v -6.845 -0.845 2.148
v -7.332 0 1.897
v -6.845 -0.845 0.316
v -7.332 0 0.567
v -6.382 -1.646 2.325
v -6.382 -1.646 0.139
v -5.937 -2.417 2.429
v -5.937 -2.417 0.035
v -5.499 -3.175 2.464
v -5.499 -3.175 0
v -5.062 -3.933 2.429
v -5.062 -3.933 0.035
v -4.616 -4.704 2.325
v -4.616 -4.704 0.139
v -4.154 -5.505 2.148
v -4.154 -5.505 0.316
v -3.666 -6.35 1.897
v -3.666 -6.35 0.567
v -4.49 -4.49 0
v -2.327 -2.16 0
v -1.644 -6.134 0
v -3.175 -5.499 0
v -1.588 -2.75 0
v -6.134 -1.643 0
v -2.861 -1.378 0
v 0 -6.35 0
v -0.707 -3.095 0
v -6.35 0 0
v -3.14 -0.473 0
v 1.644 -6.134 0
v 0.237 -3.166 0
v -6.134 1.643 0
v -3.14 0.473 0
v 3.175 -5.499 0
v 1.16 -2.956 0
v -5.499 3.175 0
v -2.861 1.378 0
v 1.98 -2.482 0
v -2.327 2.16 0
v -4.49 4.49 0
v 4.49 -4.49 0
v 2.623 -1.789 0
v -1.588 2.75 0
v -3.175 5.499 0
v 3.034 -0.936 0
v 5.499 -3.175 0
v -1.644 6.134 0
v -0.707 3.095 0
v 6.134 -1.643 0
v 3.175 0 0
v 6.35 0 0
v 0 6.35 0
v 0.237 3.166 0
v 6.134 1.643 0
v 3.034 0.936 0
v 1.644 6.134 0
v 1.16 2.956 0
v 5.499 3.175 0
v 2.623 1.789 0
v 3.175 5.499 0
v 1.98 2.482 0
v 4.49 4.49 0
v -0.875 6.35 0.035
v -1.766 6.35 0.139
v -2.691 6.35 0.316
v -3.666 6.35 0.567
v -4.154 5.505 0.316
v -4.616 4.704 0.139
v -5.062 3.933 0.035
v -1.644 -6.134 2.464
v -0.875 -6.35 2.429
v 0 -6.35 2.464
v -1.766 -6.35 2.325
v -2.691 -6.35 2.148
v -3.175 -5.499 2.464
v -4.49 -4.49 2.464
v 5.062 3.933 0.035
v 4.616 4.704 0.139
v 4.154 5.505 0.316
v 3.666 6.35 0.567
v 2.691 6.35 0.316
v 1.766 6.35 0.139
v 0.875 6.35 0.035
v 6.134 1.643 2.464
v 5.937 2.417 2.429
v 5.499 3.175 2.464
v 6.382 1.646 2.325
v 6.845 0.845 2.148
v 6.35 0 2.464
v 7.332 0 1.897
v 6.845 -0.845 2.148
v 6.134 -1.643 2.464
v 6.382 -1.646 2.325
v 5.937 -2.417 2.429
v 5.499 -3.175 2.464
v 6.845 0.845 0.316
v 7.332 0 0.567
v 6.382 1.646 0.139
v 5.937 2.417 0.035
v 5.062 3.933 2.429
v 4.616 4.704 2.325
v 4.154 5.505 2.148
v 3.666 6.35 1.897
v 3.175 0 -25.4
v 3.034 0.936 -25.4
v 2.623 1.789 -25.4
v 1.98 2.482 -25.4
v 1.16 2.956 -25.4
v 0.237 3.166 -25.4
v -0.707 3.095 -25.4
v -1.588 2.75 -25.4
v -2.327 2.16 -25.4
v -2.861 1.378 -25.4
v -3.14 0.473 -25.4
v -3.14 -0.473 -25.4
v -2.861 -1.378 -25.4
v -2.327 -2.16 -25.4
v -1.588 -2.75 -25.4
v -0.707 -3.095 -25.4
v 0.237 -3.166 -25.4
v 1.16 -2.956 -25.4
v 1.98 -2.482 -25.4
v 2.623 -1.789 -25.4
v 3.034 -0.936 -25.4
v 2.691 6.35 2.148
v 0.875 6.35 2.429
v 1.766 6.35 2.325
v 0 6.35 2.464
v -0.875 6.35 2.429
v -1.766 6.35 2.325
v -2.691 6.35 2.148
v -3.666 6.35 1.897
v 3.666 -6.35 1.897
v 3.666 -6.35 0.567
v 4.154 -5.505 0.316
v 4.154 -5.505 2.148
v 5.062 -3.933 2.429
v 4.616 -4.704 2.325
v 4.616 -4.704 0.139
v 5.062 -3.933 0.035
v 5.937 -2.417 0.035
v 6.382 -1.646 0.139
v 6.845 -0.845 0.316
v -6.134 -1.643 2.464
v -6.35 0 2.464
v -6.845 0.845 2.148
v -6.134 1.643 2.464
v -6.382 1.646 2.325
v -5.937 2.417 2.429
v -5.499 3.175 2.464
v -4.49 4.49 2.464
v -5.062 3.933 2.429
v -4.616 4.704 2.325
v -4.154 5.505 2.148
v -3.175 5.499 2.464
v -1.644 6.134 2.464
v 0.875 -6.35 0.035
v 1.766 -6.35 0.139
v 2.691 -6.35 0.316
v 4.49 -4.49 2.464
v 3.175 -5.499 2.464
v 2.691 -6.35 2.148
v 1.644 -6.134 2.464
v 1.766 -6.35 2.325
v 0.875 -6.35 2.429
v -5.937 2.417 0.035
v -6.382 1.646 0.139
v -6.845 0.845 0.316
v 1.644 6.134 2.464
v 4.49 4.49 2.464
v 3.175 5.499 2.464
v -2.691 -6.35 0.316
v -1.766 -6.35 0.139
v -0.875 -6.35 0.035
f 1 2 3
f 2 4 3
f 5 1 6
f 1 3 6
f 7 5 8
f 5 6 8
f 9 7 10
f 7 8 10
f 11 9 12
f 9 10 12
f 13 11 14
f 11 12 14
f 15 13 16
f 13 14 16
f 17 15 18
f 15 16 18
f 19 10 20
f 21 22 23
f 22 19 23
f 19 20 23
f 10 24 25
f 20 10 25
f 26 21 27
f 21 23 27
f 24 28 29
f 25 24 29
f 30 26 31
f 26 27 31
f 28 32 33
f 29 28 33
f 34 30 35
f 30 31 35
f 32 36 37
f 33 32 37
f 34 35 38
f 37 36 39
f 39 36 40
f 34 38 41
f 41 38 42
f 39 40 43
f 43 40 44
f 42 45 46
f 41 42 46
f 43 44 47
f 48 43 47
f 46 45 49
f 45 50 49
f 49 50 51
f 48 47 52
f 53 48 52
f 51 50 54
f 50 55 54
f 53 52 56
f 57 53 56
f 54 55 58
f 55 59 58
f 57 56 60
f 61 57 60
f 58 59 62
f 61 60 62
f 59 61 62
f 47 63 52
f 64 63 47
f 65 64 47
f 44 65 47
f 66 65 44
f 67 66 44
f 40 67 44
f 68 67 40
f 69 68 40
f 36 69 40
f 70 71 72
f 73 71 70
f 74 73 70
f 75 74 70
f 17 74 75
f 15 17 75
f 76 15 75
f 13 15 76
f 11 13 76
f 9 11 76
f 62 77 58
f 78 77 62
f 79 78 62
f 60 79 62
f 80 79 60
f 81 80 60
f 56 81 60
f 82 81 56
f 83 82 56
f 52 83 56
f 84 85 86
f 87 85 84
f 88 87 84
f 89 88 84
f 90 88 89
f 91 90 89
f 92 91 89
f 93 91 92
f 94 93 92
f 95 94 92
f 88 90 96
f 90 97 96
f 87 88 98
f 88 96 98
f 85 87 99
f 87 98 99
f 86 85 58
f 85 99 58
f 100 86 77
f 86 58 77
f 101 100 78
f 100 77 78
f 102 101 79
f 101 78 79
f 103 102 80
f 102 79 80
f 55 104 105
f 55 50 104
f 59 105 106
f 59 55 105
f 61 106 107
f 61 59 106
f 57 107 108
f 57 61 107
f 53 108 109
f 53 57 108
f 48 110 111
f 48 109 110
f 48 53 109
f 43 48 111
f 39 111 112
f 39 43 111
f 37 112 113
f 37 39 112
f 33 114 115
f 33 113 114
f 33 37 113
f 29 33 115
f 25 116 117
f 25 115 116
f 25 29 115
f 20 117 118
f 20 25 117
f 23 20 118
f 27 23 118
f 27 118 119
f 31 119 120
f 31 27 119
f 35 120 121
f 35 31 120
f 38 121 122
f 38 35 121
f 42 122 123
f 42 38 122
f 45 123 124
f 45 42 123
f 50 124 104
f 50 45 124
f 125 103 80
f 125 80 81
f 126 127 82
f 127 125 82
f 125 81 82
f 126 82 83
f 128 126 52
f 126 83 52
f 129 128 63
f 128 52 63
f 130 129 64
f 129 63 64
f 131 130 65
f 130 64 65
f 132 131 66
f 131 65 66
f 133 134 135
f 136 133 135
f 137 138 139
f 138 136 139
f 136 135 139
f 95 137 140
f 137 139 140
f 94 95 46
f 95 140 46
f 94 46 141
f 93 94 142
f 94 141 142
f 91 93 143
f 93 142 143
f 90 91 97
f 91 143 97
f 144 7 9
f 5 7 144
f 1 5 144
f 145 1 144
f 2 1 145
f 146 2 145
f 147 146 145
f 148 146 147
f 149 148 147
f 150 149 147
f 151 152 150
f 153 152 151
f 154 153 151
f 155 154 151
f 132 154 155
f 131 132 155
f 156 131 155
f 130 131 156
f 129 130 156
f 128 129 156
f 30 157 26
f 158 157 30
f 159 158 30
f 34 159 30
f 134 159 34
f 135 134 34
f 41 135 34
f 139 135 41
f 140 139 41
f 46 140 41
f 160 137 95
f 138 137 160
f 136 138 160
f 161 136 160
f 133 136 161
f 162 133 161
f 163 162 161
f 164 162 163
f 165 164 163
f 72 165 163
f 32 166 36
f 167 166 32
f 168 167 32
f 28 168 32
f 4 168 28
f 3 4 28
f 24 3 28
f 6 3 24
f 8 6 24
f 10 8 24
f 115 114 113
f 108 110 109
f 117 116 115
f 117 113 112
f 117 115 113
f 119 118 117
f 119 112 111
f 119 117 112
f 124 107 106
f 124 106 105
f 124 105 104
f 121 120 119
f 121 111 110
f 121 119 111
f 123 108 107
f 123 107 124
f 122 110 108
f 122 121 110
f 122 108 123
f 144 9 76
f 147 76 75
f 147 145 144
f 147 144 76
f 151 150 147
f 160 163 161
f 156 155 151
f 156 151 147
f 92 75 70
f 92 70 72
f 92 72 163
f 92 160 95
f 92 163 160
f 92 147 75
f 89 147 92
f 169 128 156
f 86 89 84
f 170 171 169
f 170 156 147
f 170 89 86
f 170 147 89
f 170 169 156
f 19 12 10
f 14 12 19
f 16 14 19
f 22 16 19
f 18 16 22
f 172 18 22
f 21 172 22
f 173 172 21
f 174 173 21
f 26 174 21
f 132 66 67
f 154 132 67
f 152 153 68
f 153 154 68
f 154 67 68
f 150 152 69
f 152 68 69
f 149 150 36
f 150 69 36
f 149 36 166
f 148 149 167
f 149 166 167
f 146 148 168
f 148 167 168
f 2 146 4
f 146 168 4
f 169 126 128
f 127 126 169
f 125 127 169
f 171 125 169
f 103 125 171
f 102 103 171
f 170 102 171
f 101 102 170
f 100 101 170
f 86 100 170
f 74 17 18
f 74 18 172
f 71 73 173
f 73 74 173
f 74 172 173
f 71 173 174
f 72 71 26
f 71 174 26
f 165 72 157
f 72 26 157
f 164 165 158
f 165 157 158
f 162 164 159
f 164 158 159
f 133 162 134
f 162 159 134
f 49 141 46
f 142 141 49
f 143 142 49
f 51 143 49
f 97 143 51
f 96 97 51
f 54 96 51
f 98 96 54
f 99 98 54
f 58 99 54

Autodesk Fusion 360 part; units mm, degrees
sketch "Sketch1" plane through (0, 0, 0) normal (0, 0, 1) x (1, 0, 0)
  line L0 (-3.6662, -6.35) -> (3.6662, -6.35)
  line L1 (3.6662, -6.35) -> (7.3323, 0)
  line L2 (7.3323, 0) -> (3.6662, 6.35)
  line L3 (3.6662, 6.35) -> (-3.6662, 6.35)
  line L4 (-3.6662, 6.35) -> (-7.3323, 0)
  line L5 (-7.3323, 0) -> (-3.6662, -6.35)
  dimension "hexwidth" = 12.7
extrude "Extrude1" add sketch "Sketch1" along normal blind 2.4638
sketch "Sketch2" plane through (0, 0, 0) normal (0, 0, -1) x (1, 0, 0)
  line L0 (-3.6662, 6.35) -> (-7.3323, 0)
  line L1 (-7.3323, 0) -> (-3.6662, -6.35)
  line L2 (-3.6662, -6.35) -> (3.6662, -6.35)
  line L3 (3.6662, -6.35) -> (7.3323, 0)
  line L4 (7.3323, 0) -> (3.6662, 6.35)
  line L5 (3.6662, 6.35) -> (-3.6662, 6.35)
  circle A0 centre (0, 0) radius 3.175
  dimension "diameter" = 6.35
extrude "Extrude2" add sketch "Sketch2" along normal blind 25.4 contours A0
sketch "Sketch3" plane through (0, 0, 2.4638) normal (0, 0, 1) x (-1, 0, 0)
  line L0 (7.3323, 0) -> (3.6662, 6.35) construction
  line L1 (3.6662, 6.35) -> (-3.6662, 6.35) construction
  line L2 (-3.6662, 6.35) -> (-7.3323, 0) construction
  line L3 (-7.3323, 0) -> (-3.6662, -6.35) construction
  line L4 (-3.6662, -6.35) -> (3.6662, -6.35) construction
  line L5 (3.6662, -6.35) -> (7.3323, 0) construction
  circle A0 centre (0, 0) radius 6.35
  circle A1 centre (0, 0) radius 19.05
  dimension "d9" = 12.7
extrude "Extrude4" cut sketch "Sketch3" against normal blind 2.032 draft -60
sketch "Sketch4" plane through (0, 0, 0) normal (0, 0, -1) x (1, 0, 0)
  circle A0 centre (0, 0) radius 3.175
  line L0 (-3.6662, 6.35) -> (-7.3323, 0) construction
  line L1 (-7.3323, 0) -> (-3.6662, -6.35) construction
  line L2 (-3.6662, -6.35) -> (3.6662, -6.35) construction
  line L3 (3.6662, -6.35) -> (7.3323, 0) construction
  line L4 (7.3323, 0) -> (3.6662, 6.35) construction
  line L5 (3.6662, 6.35) -> (-3.6662, 6.35) construction
  circle A1 centre (0, 0) radius 6.35
  circle A2 centre (0, 0) radius 19.05
  dimension "d12" = 12.7
extrude "Extrude5" cut sketch "Sketch4" against normal blind 2.032 draft -60 contours A2
equation "heightmax = 0.097 in"
equation "length = 1.0 in"
equation "hexcut2 = -0.08 in"
equation "hexcut1 = -0.08 in"
